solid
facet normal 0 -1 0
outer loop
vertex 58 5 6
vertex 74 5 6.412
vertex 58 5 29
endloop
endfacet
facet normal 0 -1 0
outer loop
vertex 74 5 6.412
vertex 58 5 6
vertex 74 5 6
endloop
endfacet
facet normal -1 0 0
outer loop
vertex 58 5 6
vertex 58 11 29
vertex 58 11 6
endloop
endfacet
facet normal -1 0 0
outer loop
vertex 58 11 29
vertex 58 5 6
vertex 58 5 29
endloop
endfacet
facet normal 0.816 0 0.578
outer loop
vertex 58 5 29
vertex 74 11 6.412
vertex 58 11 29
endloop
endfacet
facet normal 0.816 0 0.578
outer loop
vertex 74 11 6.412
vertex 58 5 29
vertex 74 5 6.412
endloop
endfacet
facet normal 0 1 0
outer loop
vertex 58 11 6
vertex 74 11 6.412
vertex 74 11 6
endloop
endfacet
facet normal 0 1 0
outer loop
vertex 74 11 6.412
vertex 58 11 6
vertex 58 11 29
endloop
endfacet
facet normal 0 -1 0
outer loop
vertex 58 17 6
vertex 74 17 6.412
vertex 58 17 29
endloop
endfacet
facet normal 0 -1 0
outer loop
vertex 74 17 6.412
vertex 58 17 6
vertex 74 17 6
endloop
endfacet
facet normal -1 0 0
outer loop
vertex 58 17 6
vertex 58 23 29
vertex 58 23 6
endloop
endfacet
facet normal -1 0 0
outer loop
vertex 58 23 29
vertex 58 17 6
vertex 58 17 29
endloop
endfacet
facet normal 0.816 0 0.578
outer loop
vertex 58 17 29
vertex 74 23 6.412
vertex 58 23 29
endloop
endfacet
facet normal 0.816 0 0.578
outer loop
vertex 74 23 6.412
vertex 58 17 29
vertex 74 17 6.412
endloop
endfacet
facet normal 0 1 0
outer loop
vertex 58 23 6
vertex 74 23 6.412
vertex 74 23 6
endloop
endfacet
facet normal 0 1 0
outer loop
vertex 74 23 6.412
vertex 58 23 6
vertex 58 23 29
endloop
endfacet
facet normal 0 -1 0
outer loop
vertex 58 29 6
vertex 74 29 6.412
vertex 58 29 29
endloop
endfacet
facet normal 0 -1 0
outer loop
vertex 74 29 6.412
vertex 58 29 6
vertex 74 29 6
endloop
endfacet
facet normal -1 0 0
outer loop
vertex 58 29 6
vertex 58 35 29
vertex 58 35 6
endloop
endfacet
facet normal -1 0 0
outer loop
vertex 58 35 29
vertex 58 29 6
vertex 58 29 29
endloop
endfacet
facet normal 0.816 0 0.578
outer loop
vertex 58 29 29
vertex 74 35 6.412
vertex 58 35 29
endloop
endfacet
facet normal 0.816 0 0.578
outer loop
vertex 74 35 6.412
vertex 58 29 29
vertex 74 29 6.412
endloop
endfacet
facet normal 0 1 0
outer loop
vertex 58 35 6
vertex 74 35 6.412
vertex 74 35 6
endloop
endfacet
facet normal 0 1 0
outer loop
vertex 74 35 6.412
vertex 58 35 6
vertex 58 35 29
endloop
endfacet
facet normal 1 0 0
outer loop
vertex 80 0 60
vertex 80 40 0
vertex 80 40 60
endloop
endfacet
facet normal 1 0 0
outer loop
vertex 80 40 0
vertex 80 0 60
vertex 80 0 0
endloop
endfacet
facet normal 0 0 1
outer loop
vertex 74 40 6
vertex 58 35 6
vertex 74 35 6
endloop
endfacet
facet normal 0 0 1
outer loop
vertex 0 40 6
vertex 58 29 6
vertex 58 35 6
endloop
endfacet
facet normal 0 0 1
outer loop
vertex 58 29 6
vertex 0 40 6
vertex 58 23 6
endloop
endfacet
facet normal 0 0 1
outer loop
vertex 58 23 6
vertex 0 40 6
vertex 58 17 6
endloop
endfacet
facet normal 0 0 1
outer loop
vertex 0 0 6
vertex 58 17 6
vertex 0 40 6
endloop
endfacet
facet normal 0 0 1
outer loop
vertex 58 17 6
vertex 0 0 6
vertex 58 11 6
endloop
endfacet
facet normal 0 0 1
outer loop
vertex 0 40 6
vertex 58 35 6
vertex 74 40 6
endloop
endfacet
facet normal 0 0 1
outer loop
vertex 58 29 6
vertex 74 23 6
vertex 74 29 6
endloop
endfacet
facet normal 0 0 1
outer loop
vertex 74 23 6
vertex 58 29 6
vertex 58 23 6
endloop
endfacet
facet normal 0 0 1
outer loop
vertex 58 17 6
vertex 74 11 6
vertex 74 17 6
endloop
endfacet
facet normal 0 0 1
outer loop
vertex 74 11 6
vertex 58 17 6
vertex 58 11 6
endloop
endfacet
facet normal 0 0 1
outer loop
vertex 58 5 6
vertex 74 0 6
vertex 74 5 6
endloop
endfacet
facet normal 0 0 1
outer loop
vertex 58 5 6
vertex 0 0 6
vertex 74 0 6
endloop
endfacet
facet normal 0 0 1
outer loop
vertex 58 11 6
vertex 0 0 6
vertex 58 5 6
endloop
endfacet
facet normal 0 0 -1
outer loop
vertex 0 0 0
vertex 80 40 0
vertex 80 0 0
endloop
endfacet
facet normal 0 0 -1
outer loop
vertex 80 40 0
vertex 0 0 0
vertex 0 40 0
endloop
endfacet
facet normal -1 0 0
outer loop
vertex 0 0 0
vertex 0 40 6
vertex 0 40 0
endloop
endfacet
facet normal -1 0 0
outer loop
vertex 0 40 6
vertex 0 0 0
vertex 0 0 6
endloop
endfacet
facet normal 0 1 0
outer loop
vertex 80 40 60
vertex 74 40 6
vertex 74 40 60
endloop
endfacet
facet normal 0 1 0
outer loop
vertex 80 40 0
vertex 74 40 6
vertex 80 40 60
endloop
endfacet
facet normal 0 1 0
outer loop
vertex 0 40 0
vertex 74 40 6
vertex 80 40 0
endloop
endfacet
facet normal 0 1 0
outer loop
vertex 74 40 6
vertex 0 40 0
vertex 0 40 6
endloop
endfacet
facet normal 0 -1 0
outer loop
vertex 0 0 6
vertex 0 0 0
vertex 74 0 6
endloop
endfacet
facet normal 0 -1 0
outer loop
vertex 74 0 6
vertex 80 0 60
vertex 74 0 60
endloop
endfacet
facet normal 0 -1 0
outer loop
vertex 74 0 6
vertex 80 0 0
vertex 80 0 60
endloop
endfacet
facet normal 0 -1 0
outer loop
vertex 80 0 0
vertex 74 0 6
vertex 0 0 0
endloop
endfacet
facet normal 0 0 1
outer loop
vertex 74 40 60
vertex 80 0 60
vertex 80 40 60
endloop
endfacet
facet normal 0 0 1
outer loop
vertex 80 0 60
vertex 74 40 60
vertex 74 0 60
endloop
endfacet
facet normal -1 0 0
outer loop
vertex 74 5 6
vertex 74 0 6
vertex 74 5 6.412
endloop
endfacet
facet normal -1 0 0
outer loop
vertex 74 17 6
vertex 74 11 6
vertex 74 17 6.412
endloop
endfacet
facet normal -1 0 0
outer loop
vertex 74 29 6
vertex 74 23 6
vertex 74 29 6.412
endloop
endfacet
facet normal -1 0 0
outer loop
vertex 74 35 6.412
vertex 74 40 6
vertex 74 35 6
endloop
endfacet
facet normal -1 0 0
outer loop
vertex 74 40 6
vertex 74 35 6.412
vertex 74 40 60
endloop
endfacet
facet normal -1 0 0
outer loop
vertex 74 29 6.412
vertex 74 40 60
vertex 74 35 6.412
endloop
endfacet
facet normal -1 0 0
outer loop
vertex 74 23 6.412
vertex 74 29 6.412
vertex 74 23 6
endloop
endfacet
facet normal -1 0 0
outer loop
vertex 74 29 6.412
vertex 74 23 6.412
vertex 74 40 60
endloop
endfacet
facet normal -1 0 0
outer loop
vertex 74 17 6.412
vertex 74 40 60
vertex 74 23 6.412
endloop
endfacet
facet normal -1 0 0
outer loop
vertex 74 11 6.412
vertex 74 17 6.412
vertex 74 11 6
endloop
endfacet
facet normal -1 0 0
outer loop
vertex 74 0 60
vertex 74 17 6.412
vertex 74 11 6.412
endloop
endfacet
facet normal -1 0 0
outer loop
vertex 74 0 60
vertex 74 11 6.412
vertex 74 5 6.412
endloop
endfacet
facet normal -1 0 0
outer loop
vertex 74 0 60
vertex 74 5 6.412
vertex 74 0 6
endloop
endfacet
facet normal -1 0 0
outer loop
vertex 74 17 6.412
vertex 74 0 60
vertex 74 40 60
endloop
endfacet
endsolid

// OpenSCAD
$fn = 32;

// ----------------------------------------------------------------------
// Rib bracket: 3-gusset L bracket
// ----------------------------------------------------------------------

// --- parameters (mm) ---
base_l = 80;              // foot length, X
base_w = 40;              // foot width, Y
base_t = 6;               // foot thickness
plate_t = 6;              // upright plate thickness
plate_h = 60;             // overall height
gus_l = 16;               // gusset leg along the foot
gus_h = 24;               // gusset height
gus_t = 6;                // gusset thickness
gus_edge = 5;             // gusset margin from the foot edge
n_gus = 3;                // gusset count

gus_pitch = (base_w - 2 * gus_edge - gus_t) / (n_gus - 1);  // gusset pitch

union() {
  cube([base_l, base_w, base_t]);
  translate([base_l - plate_t, 0, base_t - 1])
    cube([plate_t, base_w, plate_h - base_t + 1]);
  for (i = [0 : n_gus - 1])
    translate([base_l - plate_t - gus_l, gus_edge + i * gus_pitch, base_t - 1])
      rotate([-90, 0, 0])
        linear_extrude(height = gus_t)
          polygon(points = [[0, 0], [gus_l + 1, 0], [0, -gus_h]]);
}
